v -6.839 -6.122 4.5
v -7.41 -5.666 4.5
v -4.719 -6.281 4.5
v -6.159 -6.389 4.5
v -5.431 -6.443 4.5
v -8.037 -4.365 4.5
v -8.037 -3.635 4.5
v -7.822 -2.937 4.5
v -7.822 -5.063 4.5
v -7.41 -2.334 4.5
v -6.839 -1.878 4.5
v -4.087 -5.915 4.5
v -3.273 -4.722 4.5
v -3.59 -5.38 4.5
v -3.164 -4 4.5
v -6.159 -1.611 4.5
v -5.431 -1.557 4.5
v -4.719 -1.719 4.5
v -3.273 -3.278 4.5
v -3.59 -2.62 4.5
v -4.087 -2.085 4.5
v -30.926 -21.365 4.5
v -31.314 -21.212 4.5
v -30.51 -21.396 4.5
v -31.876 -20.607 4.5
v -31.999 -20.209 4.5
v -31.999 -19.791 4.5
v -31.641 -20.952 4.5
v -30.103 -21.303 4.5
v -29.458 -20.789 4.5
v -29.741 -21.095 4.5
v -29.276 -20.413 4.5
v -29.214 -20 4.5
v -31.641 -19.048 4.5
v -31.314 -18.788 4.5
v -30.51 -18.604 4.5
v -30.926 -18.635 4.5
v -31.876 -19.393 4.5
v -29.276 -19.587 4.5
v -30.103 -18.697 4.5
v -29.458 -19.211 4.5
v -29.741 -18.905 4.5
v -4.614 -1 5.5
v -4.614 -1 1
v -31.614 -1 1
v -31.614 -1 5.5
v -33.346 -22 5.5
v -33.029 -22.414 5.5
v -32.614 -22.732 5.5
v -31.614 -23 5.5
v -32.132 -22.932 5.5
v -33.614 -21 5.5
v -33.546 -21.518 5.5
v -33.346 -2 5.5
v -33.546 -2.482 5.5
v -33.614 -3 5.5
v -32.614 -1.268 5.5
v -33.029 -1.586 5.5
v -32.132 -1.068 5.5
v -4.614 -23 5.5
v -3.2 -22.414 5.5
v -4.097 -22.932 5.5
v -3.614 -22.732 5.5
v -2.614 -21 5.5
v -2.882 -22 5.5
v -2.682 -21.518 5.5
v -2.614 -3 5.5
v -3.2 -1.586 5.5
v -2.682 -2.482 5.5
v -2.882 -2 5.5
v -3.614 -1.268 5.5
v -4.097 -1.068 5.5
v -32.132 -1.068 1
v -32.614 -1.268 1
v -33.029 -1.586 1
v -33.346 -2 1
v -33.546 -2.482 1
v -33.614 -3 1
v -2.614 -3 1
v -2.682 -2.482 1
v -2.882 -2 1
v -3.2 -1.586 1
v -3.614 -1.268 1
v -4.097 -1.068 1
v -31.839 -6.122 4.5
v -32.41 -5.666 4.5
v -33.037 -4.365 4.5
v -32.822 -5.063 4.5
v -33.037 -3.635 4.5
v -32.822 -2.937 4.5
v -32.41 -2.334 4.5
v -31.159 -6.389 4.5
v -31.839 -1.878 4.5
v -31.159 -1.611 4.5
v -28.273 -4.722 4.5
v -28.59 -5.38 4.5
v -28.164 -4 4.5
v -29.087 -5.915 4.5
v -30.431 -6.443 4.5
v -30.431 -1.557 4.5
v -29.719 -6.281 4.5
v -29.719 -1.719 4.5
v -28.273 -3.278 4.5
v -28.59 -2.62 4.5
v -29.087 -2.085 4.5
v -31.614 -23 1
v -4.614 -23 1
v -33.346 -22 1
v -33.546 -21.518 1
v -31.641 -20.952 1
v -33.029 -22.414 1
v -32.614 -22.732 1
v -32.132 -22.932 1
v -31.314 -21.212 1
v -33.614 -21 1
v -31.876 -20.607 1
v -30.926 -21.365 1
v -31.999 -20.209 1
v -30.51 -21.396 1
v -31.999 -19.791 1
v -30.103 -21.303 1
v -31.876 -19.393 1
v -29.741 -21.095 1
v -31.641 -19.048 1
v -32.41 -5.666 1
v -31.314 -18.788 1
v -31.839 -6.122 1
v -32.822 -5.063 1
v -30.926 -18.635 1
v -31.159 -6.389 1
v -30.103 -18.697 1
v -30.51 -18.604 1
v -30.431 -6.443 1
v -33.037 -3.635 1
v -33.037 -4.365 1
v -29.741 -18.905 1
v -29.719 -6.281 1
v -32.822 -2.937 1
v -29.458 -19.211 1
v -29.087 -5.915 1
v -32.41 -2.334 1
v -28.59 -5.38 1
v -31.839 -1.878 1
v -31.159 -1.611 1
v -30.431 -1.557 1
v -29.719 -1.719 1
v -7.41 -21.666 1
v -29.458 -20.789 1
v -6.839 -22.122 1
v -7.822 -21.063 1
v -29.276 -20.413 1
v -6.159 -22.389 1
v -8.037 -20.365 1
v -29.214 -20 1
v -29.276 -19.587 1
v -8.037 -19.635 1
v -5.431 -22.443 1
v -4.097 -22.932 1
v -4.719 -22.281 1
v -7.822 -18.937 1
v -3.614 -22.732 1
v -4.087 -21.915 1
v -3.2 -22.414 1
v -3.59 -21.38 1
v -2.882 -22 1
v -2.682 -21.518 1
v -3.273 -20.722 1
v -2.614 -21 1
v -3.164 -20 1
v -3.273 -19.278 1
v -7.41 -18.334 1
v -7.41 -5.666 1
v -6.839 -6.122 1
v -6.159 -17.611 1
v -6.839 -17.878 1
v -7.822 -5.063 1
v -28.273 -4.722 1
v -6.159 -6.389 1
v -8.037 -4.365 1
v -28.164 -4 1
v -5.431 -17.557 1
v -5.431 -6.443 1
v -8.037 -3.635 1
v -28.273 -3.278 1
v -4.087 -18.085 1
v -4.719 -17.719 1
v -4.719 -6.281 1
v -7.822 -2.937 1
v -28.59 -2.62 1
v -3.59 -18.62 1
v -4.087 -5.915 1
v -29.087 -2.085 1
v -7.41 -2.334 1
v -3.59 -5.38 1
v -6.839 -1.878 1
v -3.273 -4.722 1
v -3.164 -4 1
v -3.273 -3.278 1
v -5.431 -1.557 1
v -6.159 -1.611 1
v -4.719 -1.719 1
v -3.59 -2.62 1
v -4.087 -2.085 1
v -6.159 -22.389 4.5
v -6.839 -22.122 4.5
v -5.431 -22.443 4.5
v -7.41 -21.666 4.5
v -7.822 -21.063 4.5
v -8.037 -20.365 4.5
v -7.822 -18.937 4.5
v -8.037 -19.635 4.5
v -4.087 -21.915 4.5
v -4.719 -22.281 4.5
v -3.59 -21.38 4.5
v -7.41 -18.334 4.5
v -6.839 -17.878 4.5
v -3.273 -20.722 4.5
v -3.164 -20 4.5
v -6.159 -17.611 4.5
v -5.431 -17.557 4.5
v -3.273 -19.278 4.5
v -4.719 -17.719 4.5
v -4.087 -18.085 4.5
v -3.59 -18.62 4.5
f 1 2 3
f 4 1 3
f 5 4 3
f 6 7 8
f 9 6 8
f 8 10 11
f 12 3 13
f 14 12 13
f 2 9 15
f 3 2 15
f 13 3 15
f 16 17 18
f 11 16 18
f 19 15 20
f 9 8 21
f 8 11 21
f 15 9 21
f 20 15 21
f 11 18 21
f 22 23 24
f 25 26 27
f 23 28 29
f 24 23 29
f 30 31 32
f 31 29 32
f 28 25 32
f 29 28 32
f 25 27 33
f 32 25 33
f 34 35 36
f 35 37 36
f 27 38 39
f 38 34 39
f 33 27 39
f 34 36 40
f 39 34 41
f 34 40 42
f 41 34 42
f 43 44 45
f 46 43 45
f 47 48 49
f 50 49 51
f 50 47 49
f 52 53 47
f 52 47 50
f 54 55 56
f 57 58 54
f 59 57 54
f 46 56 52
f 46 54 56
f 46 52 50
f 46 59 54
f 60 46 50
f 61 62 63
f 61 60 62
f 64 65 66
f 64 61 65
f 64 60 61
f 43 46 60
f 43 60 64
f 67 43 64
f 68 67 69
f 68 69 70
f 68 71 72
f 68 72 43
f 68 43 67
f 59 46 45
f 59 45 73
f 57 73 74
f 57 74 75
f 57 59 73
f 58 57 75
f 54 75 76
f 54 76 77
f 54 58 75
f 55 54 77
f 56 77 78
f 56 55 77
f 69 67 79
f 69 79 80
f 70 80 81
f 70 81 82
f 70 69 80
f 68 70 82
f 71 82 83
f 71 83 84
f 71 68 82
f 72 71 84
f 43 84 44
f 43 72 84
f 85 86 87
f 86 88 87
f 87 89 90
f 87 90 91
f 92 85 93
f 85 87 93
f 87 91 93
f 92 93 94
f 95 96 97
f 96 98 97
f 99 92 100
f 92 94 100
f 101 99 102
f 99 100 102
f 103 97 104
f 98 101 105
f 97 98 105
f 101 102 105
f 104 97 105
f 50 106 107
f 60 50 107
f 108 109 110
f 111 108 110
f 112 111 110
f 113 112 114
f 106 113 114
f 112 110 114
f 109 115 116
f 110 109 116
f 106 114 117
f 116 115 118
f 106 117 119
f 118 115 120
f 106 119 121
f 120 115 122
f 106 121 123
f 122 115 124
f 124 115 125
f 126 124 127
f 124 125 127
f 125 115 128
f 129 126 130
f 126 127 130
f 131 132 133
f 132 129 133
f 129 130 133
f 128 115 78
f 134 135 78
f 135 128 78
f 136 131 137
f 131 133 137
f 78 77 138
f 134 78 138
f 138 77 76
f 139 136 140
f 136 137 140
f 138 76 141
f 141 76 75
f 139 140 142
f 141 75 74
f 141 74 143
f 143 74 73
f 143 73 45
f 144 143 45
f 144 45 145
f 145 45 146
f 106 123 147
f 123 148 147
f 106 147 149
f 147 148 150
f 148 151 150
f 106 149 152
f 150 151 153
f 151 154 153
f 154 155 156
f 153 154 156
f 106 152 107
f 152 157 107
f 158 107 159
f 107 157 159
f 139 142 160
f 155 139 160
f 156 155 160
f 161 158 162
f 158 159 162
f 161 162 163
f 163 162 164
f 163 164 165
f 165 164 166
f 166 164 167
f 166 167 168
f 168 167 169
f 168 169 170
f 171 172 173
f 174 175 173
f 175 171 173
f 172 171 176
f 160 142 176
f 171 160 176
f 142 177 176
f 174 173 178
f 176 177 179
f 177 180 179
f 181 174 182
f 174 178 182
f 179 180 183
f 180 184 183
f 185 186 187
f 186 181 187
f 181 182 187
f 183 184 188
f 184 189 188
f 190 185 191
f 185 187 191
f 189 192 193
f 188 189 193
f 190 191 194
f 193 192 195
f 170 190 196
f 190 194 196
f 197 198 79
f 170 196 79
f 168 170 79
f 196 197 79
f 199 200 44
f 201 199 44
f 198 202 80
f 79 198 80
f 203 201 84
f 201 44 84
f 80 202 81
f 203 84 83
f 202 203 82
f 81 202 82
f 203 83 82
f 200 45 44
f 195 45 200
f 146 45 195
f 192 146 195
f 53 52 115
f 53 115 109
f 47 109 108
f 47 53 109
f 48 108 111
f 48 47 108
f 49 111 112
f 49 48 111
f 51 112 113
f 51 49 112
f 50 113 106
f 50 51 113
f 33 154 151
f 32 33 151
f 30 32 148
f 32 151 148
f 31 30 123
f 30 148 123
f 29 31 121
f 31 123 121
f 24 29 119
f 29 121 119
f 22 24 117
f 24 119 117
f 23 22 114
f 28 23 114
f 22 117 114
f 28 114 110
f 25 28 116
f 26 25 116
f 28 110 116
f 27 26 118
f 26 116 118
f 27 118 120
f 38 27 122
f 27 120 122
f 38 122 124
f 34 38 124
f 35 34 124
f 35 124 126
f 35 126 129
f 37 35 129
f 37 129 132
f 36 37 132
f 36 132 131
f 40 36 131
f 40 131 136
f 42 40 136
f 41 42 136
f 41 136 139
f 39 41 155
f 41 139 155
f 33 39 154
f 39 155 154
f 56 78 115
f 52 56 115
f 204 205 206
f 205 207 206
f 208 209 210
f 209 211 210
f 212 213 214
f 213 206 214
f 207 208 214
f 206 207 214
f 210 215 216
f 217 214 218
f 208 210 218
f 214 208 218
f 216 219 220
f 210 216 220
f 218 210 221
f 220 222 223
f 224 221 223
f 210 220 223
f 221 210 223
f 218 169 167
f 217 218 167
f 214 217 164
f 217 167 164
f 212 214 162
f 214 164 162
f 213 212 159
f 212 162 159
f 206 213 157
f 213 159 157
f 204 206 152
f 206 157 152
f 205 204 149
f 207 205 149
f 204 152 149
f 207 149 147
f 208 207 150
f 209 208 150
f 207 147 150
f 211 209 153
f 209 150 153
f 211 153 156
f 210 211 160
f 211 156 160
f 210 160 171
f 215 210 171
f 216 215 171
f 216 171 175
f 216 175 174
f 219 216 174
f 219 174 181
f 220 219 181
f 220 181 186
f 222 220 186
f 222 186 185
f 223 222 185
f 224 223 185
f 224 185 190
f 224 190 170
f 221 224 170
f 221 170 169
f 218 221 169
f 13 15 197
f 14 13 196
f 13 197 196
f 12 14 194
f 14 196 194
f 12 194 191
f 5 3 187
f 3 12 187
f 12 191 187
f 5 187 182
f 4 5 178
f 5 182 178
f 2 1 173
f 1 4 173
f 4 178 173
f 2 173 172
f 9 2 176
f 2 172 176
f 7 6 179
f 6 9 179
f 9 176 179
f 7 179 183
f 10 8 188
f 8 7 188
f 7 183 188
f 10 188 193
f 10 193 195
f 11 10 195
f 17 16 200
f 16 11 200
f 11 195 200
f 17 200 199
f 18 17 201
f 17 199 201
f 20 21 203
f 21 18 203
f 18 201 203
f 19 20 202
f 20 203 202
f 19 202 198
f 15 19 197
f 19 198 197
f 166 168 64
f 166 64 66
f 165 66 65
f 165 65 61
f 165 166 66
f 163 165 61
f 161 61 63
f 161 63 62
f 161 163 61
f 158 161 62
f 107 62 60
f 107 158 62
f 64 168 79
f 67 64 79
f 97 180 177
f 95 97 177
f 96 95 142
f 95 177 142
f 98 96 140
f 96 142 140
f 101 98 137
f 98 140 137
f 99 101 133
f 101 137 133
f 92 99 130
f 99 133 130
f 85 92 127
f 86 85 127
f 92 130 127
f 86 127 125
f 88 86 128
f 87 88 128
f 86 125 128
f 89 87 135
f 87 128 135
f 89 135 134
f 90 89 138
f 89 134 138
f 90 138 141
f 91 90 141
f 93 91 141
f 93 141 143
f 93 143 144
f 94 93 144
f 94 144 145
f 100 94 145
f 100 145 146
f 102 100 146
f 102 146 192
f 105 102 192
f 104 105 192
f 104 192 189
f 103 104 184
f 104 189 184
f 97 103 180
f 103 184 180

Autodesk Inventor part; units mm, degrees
ref_plane "YZ Plane" through (0, 0, 0) normal (1, 0, 0) x (0, 1, 0)
ref_plane "XZ Plane" through (0, 0, 0) normal (0, 1, 0) x (-1, 0, 0)
ref_plane "XY Plane" through (0, 0, 0) normal (0, 0, 1) x (1, 0, 0)
ref_plane "Work Plane1" through (24.9, 0, 1) normal (0, 0, 1) x (1, 0, 0)
sketch "Sketch1" plane through (24.9, 0, 1) normal (0, 0, 1) x (1, 0, 0)
  circle A0 centre (-55.5143, -4) radius 2.45
  circle A1 centre (-30.5143, -4) radius 2.45
  circle A2 centre (-30.5143, -20) radius 2.45
  line L0 (-55.5143, -4) -> (-30.5143, -4)
  line L1 (-30.5143, -4) -> (-30.5143, -20)
  line L2 (-30.5143, -20) -> (-55.5143, -20)
  line L3 (-55.5143, -20) -> (-55.5143, -4)
  line L4 (-27.5143, -1) -> (-58.5143, -1)
  line L5 (-58.5143, -1) -> (-58.5143, -23)
  line L6 (-58.5143, -23) -> (-27.5143, -23)
  line L7 (-27.5143, -23) -> (-27.5143, -1)
  circle A3 centre (-55.5143, -4) radius 1.4 projected
  circle A4 centre (-30.5143, -4) radius 1.4 projected
  circle A5 centre (-30.5143, -20) radius 1.4 projected
  circle A6 centre (-55.5143, -20) radius 1.4 projected
  dimension "d0" = 4.9
  dimension "d1" = 4.9
  dimension "d2" = 4.9
  dimension "d3" = 3
extrude "Extrusion1" add sketch "Sketch1" along normal blind 3.5 contours L0 A1 L1 A2 L2 A6 L3 A0 | L7 L6 L5 L4
sketch "Sketch2" plane through (24.9, 0, 4.5) normal (0, 0, 1) x (1, 0, 0)
  circle A0 centre (-30.5143, -4) radius 2.45 projected
  circle A1 centre (-30.5143, -20) radius 2.45 projected
  circle A2 centre (-55.5143, -4) radius 2.45 projected
  line L0 (-58.5143, -1) -> (-58.5143, -23) projected
  line L1 (-58.5143, -23) -> (-27.5143, -23) projected
  line L2 (-27.5143, -23) -> (-27.5143, -1) projected
  line L3 (-27.5143, -1) -> (-58.5143, -1) projected
  circle A3 centre (-55.5143, -20) radius 1.4 projected
  circle A4 centre (-30.5143, -20) radius 2.45 projected
  circle A5 centre (-30.5143, -4) radius 2.45 projected
  circle A6 centre (-55.5143, -4) radius 2.45 projected
  point P0 (-24.9, 0)
extrude "Extrusion2" add sketch "Sketch2" along normal blind 1 contours A0 | A1 | A2 | L3 L2 L1 L0 | A3
fillet "Fillet1" radius 2 4 edges at (-33.6143, -23, 3.25) (-2.6143, -23, 3.25) (-33.6143, -1, 3.25) (-2.6143, -1, 3.25)
equation "\"d1\" = d0"
equation "\"d2\" = d0"
properties part number "20_Cube_4_insert_Lens_kinematic_mirrormount_plate"
